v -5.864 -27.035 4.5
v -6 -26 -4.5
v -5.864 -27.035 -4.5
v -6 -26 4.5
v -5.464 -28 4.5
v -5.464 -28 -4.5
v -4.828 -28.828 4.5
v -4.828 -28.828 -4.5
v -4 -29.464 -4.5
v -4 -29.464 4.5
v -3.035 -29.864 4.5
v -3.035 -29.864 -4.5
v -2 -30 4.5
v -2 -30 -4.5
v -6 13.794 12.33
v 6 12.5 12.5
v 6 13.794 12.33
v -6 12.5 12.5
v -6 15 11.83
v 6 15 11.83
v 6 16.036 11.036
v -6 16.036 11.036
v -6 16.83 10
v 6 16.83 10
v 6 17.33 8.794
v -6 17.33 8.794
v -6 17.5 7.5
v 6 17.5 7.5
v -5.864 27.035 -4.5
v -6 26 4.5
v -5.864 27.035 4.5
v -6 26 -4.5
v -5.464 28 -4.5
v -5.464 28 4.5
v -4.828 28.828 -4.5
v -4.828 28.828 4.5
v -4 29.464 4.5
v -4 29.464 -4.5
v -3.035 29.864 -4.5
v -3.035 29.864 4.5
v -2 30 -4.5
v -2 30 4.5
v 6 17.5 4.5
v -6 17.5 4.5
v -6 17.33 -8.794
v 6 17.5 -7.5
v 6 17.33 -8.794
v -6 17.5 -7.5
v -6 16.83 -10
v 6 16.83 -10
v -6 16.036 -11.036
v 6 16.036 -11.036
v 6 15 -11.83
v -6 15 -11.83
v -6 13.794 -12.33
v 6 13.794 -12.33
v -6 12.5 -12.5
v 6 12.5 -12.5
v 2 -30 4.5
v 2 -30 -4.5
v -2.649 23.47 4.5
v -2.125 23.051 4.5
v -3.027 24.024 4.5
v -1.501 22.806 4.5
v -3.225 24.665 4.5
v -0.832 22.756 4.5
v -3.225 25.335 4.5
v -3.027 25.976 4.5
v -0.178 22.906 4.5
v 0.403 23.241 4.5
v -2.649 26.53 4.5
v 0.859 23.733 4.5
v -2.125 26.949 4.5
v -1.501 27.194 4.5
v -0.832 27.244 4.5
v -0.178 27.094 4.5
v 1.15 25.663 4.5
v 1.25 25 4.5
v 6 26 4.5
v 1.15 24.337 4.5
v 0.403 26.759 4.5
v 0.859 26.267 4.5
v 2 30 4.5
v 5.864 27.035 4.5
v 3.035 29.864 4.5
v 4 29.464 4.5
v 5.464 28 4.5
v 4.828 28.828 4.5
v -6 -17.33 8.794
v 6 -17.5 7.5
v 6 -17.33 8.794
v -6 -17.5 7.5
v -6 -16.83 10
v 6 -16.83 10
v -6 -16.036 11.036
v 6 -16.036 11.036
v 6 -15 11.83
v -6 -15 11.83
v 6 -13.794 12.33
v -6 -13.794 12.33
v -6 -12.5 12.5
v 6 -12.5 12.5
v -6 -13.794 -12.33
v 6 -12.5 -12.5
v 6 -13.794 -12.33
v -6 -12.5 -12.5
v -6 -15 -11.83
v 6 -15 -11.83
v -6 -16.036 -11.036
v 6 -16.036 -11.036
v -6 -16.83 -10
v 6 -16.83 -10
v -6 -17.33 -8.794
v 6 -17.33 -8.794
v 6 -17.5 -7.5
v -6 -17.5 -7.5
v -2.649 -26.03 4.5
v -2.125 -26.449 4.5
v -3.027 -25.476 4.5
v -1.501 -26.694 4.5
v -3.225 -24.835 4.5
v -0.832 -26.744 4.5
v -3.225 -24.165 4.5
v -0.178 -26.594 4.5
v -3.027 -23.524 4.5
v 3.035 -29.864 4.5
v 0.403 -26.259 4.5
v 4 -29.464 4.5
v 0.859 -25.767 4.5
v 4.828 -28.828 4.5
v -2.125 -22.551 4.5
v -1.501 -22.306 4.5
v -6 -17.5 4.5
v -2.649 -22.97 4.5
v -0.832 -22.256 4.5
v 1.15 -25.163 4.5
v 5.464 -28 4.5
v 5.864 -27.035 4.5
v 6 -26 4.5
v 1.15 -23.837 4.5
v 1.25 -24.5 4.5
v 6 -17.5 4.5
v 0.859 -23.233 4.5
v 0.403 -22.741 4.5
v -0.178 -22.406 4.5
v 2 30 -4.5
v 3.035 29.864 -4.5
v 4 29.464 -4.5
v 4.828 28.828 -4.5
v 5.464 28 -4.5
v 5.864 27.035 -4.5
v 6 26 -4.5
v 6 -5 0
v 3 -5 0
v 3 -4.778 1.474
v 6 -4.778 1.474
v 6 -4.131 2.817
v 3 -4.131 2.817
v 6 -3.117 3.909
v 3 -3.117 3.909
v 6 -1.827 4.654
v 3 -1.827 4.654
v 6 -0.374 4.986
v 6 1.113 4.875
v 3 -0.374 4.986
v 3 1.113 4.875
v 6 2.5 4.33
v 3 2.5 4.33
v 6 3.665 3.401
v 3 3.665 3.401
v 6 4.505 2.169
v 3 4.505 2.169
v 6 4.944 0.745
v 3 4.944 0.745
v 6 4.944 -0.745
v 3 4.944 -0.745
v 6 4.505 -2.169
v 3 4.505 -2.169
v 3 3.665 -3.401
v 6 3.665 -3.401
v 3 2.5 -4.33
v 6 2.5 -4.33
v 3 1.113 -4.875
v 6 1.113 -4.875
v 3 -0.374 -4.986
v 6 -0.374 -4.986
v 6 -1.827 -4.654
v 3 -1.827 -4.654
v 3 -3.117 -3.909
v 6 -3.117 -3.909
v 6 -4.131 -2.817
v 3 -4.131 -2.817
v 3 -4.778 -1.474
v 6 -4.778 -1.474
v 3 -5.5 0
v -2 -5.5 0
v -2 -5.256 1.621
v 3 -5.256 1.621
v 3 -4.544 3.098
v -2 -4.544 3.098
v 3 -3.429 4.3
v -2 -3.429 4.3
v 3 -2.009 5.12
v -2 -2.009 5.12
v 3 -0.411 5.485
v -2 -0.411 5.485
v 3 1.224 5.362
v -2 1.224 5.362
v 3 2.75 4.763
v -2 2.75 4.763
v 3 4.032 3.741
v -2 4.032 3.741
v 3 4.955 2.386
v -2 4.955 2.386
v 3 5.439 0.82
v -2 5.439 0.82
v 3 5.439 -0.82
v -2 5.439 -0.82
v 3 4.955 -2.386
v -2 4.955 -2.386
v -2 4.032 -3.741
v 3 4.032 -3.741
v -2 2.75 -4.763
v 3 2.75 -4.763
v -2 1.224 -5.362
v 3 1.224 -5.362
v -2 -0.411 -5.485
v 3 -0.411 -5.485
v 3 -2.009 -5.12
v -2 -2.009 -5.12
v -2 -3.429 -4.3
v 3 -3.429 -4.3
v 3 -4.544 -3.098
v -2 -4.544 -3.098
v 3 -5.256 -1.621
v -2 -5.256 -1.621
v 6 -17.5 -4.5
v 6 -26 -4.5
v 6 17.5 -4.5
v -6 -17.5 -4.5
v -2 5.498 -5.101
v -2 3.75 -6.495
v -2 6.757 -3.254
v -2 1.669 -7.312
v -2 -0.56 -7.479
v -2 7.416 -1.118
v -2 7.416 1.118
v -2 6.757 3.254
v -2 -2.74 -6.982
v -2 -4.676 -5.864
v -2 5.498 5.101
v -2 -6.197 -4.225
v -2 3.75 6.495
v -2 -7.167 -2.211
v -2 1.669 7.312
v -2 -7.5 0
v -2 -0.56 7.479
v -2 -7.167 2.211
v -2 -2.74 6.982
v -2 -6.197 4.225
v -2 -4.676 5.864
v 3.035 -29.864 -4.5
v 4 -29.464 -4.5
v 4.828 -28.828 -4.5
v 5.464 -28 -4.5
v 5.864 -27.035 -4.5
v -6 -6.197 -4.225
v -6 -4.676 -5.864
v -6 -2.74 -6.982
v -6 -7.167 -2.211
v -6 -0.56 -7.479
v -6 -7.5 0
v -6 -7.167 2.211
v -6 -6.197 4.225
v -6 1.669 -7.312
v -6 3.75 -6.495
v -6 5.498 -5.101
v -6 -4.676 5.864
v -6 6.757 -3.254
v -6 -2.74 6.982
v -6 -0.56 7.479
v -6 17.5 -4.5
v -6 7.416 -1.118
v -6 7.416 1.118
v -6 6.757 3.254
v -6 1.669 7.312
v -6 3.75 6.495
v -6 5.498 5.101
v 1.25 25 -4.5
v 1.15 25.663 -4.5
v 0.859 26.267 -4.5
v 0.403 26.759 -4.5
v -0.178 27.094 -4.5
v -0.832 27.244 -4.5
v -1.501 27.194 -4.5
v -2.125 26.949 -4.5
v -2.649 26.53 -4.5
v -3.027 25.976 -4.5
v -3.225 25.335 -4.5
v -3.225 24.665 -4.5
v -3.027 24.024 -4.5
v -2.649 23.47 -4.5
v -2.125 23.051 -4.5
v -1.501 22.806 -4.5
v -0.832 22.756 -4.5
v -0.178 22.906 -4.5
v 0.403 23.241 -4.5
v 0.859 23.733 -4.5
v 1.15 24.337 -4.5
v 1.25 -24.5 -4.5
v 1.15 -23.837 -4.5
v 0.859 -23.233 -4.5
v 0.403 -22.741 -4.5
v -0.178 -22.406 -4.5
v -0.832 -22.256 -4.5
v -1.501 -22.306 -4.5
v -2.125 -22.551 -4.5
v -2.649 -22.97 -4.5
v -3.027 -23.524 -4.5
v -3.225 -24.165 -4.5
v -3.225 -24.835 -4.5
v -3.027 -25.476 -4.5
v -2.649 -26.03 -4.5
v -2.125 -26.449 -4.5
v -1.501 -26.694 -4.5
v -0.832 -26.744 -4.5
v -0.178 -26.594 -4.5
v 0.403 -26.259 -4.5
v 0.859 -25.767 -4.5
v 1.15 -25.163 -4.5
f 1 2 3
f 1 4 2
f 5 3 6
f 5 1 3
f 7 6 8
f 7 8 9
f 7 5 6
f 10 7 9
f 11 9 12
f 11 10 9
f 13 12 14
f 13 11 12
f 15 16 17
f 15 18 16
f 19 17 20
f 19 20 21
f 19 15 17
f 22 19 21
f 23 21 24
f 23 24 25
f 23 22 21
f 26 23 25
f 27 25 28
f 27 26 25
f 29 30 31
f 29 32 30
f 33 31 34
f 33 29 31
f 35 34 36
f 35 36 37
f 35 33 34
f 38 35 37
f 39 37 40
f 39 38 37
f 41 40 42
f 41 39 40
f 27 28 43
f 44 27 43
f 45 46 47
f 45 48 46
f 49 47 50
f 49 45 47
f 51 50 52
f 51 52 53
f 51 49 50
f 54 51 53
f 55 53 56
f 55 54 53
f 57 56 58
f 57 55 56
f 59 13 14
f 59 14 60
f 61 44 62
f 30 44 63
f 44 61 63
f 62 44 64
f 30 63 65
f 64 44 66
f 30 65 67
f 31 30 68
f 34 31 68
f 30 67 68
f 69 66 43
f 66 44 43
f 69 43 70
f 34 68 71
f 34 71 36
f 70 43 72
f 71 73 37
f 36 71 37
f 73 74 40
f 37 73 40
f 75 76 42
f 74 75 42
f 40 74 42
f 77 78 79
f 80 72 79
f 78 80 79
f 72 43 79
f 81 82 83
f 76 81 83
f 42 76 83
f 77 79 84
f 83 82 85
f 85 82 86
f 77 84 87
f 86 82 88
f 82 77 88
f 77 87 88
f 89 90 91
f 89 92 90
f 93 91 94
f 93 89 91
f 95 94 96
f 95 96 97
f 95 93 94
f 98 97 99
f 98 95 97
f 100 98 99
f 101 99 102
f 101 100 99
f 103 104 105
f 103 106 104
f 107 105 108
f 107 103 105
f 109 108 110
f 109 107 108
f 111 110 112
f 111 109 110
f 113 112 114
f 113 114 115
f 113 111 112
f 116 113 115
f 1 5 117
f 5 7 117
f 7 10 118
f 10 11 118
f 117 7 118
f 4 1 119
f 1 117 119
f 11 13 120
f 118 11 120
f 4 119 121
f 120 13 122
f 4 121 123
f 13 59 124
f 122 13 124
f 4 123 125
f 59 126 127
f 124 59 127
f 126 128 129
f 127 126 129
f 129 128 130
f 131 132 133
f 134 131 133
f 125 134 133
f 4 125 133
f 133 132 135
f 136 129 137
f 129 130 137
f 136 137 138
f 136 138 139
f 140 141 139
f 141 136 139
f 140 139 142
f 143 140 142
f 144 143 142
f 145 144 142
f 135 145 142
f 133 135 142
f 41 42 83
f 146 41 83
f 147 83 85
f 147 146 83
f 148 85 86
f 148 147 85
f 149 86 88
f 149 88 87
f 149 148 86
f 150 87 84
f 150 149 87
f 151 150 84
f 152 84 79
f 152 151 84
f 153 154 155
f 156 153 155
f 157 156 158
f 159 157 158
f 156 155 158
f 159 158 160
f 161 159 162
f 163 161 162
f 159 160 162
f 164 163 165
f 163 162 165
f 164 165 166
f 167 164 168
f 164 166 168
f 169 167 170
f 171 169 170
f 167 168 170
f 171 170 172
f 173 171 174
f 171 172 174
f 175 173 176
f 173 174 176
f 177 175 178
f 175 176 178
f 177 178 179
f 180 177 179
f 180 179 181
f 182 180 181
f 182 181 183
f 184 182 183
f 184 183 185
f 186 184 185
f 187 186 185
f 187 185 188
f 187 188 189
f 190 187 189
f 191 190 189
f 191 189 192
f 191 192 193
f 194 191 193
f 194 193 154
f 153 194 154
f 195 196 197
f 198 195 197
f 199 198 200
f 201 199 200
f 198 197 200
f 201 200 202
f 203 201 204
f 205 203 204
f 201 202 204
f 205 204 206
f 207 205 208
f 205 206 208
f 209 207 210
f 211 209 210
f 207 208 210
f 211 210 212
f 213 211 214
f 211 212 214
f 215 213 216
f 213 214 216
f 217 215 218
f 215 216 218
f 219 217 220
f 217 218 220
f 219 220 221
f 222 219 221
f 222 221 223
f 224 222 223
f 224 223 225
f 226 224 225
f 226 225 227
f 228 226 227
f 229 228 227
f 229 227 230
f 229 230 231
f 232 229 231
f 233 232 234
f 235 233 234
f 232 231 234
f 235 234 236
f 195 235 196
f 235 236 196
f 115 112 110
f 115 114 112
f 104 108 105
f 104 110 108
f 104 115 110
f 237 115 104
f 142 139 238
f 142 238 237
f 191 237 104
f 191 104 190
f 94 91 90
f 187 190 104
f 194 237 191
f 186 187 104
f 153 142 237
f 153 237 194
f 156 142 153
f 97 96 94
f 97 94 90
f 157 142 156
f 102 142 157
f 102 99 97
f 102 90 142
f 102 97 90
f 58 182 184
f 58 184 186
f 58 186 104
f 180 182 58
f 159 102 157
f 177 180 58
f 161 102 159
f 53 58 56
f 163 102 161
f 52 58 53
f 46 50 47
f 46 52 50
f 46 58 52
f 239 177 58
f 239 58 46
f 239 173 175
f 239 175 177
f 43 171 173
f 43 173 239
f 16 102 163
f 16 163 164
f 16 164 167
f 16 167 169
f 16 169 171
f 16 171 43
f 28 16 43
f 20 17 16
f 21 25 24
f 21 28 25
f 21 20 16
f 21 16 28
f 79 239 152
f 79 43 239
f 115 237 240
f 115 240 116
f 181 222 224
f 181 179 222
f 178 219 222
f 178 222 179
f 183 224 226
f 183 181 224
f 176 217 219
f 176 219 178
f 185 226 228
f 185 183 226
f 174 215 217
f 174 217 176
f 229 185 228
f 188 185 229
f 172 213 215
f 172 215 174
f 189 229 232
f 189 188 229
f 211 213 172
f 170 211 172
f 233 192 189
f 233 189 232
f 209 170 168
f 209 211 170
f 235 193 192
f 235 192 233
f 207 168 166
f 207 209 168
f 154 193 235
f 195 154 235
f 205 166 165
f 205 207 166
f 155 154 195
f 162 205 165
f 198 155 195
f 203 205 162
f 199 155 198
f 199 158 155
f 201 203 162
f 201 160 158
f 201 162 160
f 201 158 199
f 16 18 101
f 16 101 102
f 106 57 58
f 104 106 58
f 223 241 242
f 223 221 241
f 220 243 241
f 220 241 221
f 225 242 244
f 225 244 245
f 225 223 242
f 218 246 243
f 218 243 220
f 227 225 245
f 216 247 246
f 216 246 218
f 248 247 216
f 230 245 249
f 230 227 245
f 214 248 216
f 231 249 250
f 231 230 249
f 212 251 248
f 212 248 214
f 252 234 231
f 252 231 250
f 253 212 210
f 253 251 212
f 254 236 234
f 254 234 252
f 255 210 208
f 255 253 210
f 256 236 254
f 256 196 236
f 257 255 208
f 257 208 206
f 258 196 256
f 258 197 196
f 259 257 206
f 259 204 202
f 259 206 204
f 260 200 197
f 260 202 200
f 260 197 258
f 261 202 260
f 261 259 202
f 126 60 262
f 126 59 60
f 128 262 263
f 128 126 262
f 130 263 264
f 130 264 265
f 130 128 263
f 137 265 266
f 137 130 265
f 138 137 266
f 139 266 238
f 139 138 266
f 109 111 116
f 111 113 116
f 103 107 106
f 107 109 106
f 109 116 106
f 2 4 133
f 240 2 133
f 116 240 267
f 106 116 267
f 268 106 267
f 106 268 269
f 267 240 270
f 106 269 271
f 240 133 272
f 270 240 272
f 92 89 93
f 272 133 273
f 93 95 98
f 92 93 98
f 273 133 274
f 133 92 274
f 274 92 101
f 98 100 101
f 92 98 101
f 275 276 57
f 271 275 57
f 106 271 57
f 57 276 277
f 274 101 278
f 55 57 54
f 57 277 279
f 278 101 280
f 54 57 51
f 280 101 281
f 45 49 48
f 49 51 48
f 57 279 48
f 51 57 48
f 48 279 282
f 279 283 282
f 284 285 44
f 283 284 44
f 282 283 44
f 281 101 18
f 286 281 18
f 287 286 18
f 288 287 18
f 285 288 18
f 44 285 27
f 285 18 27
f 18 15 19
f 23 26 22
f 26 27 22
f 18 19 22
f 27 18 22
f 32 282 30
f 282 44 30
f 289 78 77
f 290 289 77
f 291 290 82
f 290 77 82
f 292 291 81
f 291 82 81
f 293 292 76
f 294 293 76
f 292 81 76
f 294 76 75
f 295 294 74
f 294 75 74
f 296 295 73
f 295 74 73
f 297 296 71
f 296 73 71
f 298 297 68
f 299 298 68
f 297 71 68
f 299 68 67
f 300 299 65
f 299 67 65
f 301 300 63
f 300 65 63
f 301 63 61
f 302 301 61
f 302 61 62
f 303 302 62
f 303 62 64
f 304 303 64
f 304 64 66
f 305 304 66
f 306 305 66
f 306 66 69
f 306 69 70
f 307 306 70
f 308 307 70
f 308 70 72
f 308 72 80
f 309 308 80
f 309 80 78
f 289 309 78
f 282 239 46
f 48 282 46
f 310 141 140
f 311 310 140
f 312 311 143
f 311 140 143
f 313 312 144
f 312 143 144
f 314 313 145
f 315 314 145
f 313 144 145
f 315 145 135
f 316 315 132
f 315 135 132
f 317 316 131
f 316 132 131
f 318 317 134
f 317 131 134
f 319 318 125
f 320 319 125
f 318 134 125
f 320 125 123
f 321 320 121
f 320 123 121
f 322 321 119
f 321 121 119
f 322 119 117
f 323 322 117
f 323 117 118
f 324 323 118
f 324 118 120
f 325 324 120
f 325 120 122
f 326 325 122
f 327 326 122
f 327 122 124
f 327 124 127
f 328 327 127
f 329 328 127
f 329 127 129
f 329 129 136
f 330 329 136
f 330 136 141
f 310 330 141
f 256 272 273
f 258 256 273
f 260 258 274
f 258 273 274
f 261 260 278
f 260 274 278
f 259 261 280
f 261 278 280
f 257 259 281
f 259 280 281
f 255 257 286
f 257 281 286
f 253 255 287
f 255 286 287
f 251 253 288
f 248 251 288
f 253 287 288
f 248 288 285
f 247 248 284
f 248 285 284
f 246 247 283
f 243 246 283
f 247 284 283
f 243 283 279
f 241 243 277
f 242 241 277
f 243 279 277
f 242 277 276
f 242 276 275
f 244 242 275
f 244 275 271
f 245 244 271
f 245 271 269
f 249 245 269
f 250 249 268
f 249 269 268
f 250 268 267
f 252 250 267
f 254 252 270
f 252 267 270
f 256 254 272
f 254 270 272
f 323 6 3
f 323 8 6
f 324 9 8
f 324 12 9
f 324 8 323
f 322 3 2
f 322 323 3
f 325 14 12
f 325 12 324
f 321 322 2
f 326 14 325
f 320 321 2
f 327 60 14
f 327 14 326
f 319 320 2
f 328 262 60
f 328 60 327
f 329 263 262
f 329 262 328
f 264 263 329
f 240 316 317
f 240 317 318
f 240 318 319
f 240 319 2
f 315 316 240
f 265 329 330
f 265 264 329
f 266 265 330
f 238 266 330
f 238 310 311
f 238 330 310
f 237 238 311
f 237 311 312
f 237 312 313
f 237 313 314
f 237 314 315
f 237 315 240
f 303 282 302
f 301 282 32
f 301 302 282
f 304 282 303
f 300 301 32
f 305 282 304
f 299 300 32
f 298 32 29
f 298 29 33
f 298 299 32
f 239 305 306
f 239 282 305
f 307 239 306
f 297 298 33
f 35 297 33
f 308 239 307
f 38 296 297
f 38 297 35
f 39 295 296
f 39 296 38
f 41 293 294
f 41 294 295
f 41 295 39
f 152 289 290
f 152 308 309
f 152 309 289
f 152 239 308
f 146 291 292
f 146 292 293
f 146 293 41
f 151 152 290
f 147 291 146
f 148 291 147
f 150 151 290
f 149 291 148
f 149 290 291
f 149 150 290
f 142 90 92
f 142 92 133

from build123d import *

# Parameters (mm, degrees)
SKETCH2_W           = 12
SKETCH2_H           = 60
BOSS_EXTRUDE1_DEPTH = 12.5
SKETCH3_W           = 8
SKETCH3_H           = 12.5
CUT_EXTRUDE1_DEPTH  = 35.644624403
SKETCH4_R           = 2.25
CUT_EXTRUDE2_DEPTH  = 36
FILLET1_R           = 5
FILLET2_R           = 4
CUT_EXTRUDE3_START  = -8
SKETCH5_R           = 5
CUT_EXTRUDE3_DEPTH  = 4
SKETCH6_R           = 7.5
CUT_EXTRUDE4_DEPTH  = 4
SKETCH8_R           = 5.5
CUT_EXTRUDE6_DEPTH  = 5


with BuildPart() as part:
    # Sketch2 → Boss-Extrude1 (new, symmetric)
    with BuildSketch(Plane.XY):
        Rectangle(SKETCH2_W, SKETCH2_H)
    extrude(amount=BOSS_EXTRUDE1_DEPTH, both=True)

    # Sketch3 → Cut-Extrude1 (cut, through all)
    with BuildSketch(Plane(origin=(6, 0, 0), x_dir=(0, 0, -1), z_dir=(1, 0, 0))):
        with Locations((-8.5, -23.75)):
            Rectangle(SKETCH3_W, SKETCH3_H)
        with Locations((8.5, -23.75)):
            Rectangle(SKETCH3_W, SKETCH3_H)
        with Locations((8.5, 23.75)):
            Rectangle(SKETCH3_W, SKETCH3_H)
        with Locations((-8.5, 23.75)):
            Rectangle(SKETCH3_W, SKETCH3_H)
    extrude(amount=-CUT_EXTRUDE1_DEPTH, mode=Mode.SUBTRACT)

    # Sketch4 → Cut-Extrude2 (cut, through all)
    with BuildSketch(Plane.XY.offset(4.5)):
        with Locations((-1, 25)):
            Circle(SKETCH4_R)
        with Locations((-1, -24.5)):
            Circle(SKETCH4_R)
    extrude(amount=-CUT_EXTRUDE2_DEPTH, mode=Mode.SUBTRACT)

    # Fillet1
    fillet1_edges = [part.edges().sort_by_distance(p)[0] for p in [
        (0, 17.5, 12.5),
        (0, 17.5, -12.5),
        (0, -17.5, -12.5),
        (0, -17.5, 12.5),
    ]]
    fillet(fillet1_edges, radius=FILLET1_R)

    # Fillet2
    fillet2_edges = [part.edges().sort_by_distance(p)[0] for p in [
        (6, -30, 0),
        (-6, -30, 0),
        (-6, 30, 0),
        (6, 30, 0),
    ]]
    fillet(fillet2_edges, radius=FILLET2_R)

    # Sketch5 → Cut-Extrude3 (cut)
    with BuildSketch(Plane.ZY.offset(6).offset(CUT_EXTRUDE3_START)):
        with Locations(Location((0, 0, 0), (0, 0, 270))):
            Circle(SKETCH5_R)
    extrude(amount=-CUT_EXTRUDE3_DEPTH, mode=Mode.SUBTRACT)

    # Sketch6 → Cut-Extrude4 (cut)
    with BuildSketch(Plane.ZY.offset(6)):
        with Locations(Location((0, 0, 0), (0, 0, 270))):
            Circle(SKETCH6_R)
    extrude(amount=-CUT_EXTRUDE4_DEPTH, mode=Mode.SUBTRACT)

    # Sketch8 → Cut-Extrude6 (cut)
    with BuildSketch(Plane.ZY.offset(2)):
        with Locations(Location((0, 0, 0), (0, 0, 270))):
            Circle(SKETCH8_R)
    extrude(amount=-CUT_EXTRUDE6_DEPTH, mode=Mode.SUBTRACT)


solid = part.part
